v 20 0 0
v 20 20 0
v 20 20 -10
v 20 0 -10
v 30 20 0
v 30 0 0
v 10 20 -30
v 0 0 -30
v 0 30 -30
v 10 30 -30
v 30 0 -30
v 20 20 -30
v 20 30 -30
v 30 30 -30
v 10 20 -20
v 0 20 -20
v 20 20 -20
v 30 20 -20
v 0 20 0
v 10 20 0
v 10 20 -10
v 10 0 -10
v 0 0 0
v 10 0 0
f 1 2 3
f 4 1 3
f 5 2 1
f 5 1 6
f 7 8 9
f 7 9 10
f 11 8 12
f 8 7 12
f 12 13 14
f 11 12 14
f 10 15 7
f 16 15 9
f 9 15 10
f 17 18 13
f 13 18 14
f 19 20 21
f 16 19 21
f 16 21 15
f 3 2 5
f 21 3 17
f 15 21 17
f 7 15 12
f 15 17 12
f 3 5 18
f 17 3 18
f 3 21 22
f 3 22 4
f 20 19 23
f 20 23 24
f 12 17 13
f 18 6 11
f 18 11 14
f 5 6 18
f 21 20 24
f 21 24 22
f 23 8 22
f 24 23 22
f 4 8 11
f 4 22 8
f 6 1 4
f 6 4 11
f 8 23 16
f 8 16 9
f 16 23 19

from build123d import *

# Parameters (mm, degrees)
SKETCH_1_W           = 30
SKETCH_1_H           = 30
EXTRUDE_1_DEPTH      = 30
SKETCH_42_W          = 10
SKETCH_42_H          = 10
CUT_EXTRUDE_29_DEPTH = 52.961524227
SKETCH_43_W          = 20
SKETCH_43_H          = 10
CUT_EXTRUDE_30_DEPTH = 52.961524227
SKETCH_44_W          = 10
SKETCH_44_H          = 10
CUT_EXTRUDE_31_DEPTH = 47.904157598


with BuildPart() as part:
    # 草圖1 → 填料-伸1 (new body)
    with BuildSketch(Plane.XY):
        with Locations((15, 15)):
            Rectangle(SKETCH_1_W, SKETCH_1_H)
    extrude(amount=-EXTRUDE_1_DEPTH)

    # 草圖42 → 除料-伸長29 (cut, through all)
    with BuildSketch(Plane.XY):
        with Locations((15, 25)):
            Rectangle(SKETCH_42_W, SKETCH_42_H)
    extrude(amount=-CUT_EXTRUDE_29_DEPTH, mode=Mode.SUBTRACT)

    # 草圖43 → 除料-伸長30 (cut, through all)
    with BuildSketch(Plane(origin=(30, 0, 0), x_dir=(0, 0, -1), z_dir=(1, 0, 0))):
        Polygon((30, 30), (20, 30), (20, 20), align=None)
        with Locations((10, 25)):
            Rectangle(SKETCH_43_W, SKETCH_43_H)
    extrude(amount=-CUT_EXTRUDE_30_DEPTH, mode=Mode.SUBTRACT)

    # 草圖44 → 除料-伸長31 (cut, through all)
    with BuildSketch(Plane(origin=(0, 20, 0), x_dir=(1, 0, 0), z_dir=(0, 1, 0))):
        with Locations((15, 5)):
            Rectangle(SKETCH_44_W, SKETCH_44_H)
    extrude(amount=-CUT_EXTRUDE_31_DEPTH, mode=Mode.SUBTRACT)


solid = part.part
